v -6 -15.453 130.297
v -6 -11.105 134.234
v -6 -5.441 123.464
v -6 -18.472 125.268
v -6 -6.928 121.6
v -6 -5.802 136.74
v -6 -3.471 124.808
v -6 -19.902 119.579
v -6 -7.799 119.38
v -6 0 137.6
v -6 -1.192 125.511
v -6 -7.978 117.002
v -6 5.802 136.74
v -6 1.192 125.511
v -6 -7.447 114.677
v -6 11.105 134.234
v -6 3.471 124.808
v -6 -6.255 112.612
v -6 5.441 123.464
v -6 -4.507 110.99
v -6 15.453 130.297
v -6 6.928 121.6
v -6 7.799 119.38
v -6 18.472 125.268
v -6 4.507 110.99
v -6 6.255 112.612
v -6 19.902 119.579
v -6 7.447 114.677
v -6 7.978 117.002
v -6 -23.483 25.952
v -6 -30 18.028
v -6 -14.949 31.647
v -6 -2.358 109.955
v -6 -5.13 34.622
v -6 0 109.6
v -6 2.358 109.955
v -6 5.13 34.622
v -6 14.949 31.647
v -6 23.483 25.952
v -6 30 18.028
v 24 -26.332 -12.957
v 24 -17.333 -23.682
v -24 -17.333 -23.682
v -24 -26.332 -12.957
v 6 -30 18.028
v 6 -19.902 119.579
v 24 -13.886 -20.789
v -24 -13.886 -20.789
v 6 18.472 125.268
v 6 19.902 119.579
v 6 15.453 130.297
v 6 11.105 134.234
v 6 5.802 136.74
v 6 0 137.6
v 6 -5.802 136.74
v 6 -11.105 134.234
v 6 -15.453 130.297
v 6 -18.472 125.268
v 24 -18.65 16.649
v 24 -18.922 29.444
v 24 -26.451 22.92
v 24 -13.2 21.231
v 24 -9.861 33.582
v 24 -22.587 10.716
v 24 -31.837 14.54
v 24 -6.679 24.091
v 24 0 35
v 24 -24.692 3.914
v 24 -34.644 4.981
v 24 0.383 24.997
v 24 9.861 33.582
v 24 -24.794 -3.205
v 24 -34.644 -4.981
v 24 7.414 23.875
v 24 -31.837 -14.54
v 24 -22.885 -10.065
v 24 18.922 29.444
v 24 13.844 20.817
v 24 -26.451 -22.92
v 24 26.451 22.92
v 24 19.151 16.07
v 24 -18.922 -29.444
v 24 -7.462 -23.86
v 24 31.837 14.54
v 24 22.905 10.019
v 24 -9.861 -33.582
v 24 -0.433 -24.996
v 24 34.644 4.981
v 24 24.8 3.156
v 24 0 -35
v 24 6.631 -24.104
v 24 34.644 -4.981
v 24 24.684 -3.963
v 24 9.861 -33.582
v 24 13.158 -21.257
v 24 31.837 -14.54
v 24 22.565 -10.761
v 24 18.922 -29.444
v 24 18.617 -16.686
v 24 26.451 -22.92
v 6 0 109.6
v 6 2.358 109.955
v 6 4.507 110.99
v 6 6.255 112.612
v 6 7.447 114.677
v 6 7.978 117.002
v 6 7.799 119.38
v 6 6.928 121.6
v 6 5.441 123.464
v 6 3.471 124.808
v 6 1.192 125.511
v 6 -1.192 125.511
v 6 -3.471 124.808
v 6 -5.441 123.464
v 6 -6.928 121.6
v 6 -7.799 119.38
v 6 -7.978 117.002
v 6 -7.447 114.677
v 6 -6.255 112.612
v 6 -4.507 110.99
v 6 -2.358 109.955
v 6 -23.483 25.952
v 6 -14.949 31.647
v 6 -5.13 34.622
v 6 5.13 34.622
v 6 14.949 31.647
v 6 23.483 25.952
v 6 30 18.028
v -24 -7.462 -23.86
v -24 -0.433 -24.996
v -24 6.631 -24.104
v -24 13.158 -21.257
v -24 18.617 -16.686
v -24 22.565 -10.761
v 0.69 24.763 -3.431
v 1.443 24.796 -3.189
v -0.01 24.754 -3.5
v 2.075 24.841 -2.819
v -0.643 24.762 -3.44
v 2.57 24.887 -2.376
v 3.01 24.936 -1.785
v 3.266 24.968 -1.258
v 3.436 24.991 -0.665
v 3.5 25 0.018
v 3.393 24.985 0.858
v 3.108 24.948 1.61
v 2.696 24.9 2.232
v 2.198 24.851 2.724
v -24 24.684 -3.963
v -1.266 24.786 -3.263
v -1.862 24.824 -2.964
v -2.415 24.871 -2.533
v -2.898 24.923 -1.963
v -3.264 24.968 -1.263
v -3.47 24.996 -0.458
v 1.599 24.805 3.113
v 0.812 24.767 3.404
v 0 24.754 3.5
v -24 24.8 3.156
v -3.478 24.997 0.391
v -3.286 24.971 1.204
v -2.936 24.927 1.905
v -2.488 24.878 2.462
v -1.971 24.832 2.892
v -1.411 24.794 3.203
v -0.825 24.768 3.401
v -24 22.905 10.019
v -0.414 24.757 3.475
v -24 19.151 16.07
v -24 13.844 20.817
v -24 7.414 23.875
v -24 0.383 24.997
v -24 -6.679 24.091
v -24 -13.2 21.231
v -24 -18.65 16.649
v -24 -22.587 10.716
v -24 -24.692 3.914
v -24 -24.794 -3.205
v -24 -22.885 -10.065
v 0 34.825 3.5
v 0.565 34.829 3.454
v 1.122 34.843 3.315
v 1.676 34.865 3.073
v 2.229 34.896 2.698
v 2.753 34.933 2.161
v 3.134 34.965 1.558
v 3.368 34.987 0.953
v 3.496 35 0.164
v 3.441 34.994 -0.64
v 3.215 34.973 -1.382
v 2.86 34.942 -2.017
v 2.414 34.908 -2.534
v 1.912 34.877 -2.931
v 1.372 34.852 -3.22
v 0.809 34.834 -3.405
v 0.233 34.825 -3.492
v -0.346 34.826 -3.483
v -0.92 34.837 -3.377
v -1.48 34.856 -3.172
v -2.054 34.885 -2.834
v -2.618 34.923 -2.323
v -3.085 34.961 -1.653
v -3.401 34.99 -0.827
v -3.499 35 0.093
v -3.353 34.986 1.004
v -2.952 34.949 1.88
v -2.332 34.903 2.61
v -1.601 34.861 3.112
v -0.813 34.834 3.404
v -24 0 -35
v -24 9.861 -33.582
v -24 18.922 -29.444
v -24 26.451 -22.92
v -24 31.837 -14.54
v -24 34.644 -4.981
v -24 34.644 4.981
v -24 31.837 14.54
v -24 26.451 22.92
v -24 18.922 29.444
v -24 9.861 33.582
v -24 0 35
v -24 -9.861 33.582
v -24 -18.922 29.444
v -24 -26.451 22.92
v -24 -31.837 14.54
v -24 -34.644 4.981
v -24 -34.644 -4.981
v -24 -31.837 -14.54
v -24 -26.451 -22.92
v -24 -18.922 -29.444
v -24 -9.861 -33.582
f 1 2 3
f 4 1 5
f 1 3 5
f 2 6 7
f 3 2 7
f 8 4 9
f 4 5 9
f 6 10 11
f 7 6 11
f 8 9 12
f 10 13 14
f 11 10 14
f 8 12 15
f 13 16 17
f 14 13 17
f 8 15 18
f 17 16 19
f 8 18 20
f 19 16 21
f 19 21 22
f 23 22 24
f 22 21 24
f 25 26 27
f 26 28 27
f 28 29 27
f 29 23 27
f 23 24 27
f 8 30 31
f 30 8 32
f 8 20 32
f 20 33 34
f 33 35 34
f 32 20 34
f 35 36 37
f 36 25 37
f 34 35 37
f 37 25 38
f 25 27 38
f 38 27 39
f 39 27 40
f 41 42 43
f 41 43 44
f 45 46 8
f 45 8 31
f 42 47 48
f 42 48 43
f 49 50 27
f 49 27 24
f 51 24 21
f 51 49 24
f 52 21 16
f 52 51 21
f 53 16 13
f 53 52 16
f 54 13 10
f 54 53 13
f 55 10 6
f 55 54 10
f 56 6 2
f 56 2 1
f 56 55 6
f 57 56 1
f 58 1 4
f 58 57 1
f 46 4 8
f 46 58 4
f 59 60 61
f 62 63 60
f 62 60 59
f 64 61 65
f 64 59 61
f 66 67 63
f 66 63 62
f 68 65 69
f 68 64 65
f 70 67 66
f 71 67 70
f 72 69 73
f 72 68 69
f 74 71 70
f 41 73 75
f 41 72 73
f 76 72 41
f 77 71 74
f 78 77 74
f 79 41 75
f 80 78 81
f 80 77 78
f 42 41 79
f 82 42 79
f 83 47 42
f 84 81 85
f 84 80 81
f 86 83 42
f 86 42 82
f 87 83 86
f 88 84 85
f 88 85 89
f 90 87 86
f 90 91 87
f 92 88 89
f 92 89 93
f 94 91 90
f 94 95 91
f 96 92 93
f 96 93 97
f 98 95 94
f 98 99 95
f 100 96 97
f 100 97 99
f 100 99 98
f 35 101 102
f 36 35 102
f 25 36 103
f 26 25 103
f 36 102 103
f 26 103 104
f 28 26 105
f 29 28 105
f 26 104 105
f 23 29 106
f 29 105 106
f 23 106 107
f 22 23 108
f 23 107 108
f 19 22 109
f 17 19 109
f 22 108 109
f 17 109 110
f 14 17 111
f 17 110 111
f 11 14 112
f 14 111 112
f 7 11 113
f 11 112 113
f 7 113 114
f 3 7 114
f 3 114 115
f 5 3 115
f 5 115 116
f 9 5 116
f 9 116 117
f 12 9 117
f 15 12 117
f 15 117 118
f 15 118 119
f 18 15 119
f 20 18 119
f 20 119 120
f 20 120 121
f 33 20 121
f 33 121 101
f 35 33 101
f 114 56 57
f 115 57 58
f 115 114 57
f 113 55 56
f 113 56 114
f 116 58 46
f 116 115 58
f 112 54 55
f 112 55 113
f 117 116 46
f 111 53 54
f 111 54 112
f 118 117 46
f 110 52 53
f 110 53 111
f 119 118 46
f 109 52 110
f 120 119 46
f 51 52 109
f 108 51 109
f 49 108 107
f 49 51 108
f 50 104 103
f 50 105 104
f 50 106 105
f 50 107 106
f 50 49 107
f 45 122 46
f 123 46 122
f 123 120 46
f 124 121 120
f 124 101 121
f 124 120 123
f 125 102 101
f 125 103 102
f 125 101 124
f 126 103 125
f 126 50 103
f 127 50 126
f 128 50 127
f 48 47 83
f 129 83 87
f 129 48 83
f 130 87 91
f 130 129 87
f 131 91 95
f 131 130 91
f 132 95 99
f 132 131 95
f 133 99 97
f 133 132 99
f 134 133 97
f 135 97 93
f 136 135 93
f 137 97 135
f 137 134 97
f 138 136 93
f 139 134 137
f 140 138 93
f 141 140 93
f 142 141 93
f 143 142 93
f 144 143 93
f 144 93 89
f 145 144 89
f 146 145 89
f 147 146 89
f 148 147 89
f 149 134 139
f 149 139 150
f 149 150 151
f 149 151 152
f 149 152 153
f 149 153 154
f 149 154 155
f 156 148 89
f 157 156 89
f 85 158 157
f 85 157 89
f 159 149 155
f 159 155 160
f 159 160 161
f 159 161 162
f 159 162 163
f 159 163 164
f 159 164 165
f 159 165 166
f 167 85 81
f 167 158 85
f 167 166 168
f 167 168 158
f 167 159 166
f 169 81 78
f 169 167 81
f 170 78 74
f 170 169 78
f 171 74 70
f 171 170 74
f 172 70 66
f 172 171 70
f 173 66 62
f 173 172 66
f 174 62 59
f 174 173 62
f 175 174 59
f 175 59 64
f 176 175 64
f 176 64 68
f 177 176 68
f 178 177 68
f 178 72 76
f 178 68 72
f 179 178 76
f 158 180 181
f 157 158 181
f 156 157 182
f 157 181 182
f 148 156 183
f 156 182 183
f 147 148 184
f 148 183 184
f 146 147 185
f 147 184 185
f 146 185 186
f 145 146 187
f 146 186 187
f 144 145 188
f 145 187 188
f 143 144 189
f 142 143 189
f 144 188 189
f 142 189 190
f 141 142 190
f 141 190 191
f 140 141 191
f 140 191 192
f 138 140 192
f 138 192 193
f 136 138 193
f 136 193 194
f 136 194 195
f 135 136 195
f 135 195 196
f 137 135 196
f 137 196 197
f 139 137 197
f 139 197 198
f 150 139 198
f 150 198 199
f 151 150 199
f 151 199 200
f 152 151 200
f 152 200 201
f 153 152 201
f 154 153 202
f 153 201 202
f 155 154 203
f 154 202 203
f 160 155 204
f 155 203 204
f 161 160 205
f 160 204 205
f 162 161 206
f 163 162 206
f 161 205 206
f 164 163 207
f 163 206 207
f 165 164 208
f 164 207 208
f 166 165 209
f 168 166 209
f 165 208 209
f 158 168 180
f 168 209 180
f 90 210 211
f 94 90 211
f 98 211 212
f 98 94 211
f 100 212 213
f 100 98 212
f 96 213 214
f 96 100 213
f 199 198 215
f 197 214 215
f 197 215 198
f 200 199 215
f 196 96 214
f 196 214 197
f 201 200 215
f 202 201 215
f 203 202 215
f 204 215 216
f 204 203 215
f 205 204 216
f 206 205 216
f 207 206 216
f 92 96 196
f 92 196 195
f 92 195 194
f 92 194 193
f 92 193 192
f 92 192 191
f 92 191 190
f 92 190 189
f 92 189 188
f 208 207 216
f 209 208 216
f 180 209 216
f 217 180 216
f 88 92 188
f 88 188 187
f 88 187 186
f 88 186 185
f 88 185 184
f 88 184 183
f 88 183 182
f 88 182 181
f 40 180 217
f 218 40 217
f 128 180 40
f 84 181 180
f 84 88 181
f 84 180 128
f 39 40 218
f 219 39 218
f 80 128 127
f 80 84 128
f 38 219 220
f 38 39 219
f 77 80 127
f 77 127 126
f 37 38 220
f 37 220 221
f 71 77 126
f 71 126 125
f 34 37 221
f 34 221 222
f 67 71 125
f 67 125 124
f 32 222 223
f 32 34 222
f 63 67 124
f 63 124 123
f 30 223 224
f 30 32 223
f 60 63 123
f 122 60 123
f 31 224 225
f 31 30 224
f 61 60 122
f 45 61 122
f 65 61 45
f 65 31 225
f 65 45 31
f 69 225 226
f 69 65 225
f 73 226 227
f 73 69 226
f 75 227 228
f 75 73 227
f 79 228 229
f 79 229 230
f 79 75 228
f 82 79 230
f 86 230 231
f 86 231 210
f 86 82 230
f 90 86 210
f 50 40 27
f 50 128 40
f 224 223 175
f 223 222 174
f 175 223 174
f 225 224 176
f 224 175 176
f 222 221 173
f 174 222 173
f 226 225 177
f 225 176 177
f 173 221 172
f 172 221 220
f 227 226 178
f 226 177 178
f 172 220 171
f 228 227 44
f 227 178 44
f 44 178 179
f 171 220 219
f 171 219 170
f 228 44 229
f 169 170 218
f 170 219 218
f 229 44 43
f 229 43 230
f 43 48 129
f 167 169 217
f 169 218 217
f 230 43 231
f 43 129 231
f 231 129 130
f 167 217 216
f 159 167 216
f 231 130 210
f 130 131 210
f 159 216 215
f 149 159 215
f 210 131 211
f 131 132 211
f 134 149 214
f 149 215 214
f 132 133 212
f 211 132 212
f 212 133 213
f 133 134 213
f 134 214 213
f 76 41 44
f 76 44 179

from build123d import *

# Parameters (mm, degrees)
SKETCH1_R           = 35
SKETCH1_R_2         = 25
BOSS_EXTRUDE1_DEPTH = 24
BOSS_EXTRUDE2_DEPTH = 6
SKETCH3_R           = 8
CUT_EXTRUDE1_DEPTH  = 15
CUT_EXTRUDE2_DEPTH  = 150.875815261
SKETCH6_R           = 3.5
CUT_EXTRUDE3_DEPTH  = 24


with BuildPart() as part:
    # Sketch1 → Boss-Extrude1 (new, symmetric)
    with BuildSketch(Plane(origin=(0, 0, 0), x_dir=(0, 0, -1), z_dir=(1, 0, 0))):
        Circle(SKETCH1_R)
        Circle(SKETCH1_R_2, mode=Mode.SUBTRACT)
    extrude(amount=BOSS_EXTRUDE1_DEPTH, both=True)

    # Sketch2 → Boss-Extrude2 (add, symmetric)
    with BuildSketch(Plane(origin=(0, 0, 0), x_dir=(0, 0, -1), z_dir=(1, 0, 0))):
        with BuildLine():
            Line((-18.027756377, 30), (-119.579019246, 19.901846216))
            ThreePointArc((-119.579019246, 19.901846216), (-137.6, 0), (-119.579019246, -19.901846216))
            Line((-119.579019246, -19.901846216), (-18.027756377, -30))
            ThreePointArc((-18.027756377, -30), (-35, 0), (-18.027756377, 30))
        make_face()
    extrude(amount=BOSS_EXTRUDE2_DEPTH, both=True)

    # Sketch3 → Cut-Extrude1 (cut)
    with BuildSketch(Plane(origin=(6, 0, 0), x_dir=(0, 0, -1), z_dir=(1, 0, 0))):
        with Locations((-117.6, 0)):
            Circle(SKETCH3_R)
    extrude(amount=-CUT_EXTRUDE1_DEPTH, mode=Mode.SUBTRACT)

    # Sketch5 → Cut-Extrude2 (cut, through all)
    with BuildSketch(Plane(origin=(24, 0, 0), x_dir=(0, 0, -1), z_dir=(1, 0, 0))):
        Polygon((23.681757978, -17.332753361), (12.957135774, -26.331779897), (3.997953594, -15.654642346), (14.722575797, -6.655615811), align=None)
    extrude(amount=-CUT_EXTRUDE2_DEPTH, mode=Mode.SUBTRACT)

    # Sketch6 → Cut-Extrude3 (cut)
    with BuildSketch(Plane(origin=(0, 35, 0), x_dir=(-1, 0, 0), z_dir=(0, 1, 0))):
        with Locations(Location((0, 0, 0), (0, 0, 90))):
            Circle(SKETCH6_R)
    extrude(amount=-CUT_EXTRUDE3_DEPTH, mode=Mode.SUBTRACT)


solid = part.part
